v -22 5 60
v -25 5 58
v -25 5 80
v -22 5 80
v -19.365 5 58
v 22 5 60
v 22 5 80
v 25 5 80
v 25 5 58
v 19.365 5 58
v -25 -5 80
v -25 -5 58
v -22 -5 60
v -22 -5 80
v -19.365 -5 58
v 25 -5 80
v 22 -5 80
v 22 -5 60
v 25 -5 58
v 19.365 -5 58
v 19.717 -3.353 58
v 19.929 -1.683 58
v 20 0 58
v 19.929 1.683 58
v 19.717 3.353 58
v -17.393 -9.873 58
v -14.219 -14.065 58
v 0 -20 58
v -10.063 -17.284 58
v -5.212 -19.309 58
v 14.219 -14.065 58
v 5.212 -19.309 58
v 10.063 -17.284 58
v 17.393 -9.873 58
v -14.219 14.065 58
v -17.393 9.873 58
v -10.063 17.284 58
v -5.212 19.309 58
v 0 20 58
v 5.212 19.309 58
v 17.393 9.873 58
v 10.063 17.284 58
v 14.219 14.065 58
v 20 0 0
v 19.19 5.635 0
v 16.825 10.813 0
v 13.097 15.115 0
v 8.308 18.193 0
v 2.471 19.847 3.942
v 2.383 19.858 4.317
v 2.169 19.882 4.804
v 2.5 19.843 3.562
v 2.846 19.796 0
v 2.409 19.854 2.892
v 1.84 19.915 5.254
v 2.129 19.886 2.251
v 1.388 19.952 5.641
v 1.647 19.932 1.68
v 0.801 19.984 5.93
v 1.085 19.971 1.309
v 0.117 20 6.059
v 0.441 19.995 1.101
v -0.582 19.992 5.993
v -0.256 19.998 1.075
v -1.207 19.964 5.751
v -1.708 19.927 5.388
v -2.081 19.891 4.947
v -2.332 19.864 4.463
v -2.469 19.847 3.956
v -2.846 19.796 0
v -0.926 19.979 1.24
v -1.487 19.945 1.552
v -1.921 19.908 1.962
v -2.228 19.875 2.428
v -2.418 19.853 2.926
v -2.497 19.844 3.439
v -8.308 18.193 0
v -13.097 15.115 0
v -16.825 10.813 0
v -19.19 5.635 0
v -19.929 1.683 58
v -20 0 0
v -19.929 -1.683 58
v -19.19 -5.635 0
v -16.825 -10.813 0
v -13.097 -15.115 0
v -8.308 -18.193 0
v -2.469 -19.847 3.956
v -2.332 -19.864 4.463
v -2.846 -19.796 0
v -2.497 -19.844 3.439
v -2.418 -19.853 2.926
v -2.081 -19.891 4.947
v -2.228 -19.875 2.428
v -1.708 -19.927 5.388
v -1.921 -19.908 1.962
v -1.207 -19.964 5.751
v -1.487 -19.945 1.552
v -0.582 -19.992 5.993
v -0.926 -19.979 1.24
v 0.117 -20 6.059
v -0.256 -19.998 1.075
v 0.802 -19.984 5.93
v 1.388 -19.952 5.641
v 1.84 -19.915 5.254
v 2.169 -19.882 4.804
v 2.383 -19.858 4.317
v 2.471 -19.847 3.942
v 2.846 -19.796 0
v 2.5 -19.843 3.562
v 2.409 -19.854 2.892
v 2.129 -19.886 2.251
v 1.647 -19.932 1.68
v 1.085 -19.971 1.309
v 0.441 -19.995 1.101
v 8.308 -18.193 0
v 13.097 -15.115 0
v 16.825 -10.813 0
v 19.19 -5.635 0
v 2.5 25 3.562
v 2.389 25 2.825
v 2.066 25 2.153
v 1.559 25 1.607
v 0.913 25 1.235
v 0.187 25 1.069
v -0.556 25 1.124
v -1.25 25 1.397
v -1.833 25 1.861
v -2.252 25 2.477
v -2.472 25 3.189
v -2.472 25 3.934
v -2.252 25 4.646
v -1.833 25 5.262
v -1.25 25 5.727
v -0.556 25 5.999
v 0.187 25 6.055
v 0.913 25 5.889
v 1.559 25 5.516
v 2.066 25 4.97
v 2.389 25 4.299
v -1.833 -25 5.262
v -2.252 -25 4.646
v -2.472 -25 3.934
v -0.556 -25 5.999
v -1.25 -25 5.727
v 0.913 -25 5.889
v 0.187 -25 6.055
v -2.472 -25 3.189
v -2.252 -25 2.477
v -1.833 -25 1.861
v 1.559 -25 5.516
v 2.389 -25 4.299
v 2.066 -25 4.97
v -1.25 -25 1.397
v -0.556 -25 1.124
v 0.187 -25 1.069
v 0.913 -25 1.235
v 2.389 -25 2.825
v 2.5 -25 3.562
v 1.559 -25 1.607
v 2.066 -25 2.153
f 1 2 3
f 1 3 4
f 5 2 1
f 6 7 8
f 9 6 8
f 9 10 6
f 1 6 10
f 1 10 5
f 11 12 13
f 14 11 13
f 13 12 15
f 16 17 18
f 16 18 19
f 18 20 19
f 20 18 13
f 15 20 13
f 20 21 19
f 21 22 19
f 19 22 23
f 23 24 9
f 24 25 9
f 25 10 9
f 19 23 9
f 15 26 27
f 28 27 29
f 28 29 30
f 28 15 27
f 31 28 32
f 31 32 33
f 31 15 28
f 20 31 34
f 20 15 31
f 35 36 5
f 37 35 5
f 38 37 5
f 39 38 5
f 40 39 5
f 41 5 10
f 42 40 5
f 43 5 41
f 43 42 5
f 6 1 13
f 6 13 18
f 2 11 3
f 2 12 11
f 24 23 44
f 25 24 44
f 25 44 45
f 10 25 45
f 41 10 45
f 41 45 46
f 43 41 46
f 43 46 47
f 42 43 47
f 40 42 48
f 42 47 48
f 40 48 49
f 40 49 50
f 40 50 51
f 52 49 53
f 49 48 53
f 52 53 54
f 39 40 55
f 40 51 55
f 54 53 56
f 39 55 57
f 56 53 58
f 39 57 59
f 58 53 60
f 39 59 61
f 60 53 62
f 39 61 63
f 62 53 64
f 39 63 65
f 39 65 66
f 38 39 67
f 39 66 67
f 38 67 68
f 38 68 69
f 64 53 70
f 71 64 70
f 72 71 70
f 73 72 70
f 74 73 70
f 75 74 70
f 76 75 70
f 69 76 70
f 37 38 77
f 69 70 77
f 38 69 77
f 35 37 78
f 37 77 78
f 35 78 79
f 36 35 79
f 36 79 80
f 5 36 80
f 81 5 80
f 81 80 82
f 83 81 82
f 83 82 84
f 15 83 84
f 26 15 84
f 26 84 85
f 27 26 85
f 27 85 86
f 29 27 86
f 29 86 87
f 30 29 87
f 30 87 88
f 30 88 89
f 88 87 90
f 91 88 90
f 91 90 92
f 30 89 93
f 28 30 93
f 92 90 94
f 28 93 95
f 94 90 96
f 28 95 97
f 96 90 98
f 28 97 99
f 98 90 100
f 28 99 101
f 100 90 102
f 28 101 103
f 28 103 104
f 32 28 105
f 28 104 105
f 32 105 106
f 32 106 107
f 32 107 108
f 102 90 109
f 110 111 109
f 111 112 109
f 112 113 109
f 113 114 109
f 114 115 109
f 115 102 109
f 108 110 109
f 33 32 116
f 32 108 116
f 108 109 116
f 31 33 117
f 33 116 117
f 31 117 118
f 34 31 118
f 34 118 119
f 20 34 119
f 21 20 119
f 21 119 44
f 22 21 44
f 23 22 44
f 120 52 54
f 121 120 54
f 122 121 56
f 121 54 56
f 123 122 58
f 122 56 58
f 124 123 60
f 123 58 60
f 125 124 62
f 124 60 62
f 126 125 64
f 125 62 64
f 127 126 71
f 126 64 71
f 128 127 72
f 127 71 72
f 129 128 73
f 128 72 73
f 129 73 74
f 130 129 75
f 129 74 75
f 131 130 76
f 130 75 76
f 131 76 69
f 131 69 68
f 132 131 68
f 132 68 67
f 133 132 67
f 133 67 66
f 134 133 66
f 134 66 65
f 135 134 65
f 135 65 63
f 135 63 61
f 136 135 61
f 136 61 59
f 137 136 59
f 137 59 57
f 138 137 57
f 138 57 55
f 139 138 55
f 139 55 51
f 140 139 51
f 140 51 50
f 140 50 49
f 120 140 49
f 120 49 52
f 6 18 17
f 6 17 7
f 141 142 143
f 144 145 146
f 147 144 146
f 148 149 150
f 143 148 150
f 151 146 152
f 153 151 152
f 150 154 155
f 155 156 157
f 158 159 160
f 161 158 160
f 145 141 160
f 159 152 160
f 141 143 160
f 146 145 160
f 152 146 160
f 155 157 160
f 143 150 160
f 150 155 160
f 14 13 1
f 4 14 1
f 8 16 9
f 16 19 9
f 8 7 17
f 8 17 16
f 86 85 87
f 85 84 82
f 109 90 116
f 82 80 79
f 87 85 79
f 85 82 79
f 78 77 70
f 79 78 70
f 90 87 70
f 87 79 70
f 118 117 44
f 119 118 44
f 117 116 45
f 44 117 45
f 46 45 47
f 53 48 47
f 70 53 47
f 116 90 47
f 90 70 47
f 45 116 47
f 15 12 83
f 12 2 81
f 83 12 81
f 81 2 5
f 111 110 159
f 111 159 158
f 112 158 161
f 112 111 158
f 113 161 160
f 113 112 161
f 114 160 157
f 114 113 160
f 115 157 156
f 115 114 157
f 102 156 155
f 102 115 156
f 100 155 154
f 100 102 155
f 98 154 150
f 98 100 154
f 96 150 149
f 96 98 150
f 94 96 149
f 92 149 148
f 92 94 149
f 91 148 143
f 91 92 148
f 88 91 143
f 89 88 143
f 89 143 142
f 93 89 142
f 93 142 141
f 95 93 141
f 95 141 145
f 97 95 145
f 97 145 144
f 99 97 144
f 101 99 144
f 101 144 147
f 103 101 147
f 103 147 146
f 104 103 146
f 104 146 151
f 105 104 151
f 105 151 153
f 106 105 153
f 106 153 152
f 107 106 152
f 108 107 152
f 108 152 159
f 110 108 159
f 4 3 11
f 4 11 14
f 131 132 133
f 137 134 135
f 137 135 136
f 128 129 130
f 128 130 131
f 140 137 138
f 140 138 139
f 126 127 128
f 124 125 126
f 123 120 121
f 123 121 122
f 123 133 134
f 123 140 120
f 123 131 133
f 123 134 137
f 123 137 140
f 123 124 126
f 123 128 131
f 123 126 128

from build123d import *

# Parameters (mm, degrees)
SKETCH1_R           = 20
BOSS_EXTRUDE1_DEPTH = 58
SKETCH7_R           = 2.5
BOSS_EXTRUDE2_DEPTH = 25
SKETCH8_W           = 50
SKETCH8_H           = 10
BOSS_EXTRUDE3_DEPTH = 2
SKETCH9_W           = 3
SKETCH9_H           = 10
BOSS_EXTRUDE4_DEPTH = 20
SKETCH10_W          = 3
SKETCH10_H          = 10
BOSS_EXTRUDE5_DEPTH = 20


with BuildPart() as part:
    # Sketch1 → Boss-Extrude1 (new body)
    with BuildSketch(Plane.XY):
        Circle(SKETCH1_R)
    extrude(amount=BOSS_EXTRUDE1_DEPTH)

    # Sketch7 → Boss-Extrude2 (add)
    with BuildSketch(Plane(origin=(0, 0, 0), x_dir=(1, 0, 0), z_dir=(0, 1, 0))):
        with Locations((0, -3.561686207)):
            Circle(SKETCH7_R)
    boss_extrude2 = extrude(amount=BOSS_EXTRUDE2_DEPTH)

    # Sketch8 → Boss-Extrude3 (add)
    with BuildSketch(Plane.XY.offset(58)):
        Rectangle(SKETCH8_W, SKETCH8_H)
    extrude(amount=BOSS_EXTRUDE3_DEPTH)

    # Sketch9 → Boss-Extrude4 (add)
    with BuildSketch(Plane.XY.offset(60)):
        with Locations((-23.5, 0)):
            Rectangle(SKETCH9_W, SKETCH9_H)
    extrude(amount=BOSS_EXTRUDE4_DEPTH)

    # Sketch10 → Boss-Extrude5 (add)
    with BuildSketch(Plane.XY.offset(60)):
        with Locations((23.5, 0)):
            Rectangle(SKETCH10_W, SKETCH10_H)
    extrude(amount=BOSS_EXTRUDE5_DEPTH)

    # Mirror1: Boss-Extrude2 across plane
    add(boss_extrude2.mirror(Plane.ZX))


solid = part.part
